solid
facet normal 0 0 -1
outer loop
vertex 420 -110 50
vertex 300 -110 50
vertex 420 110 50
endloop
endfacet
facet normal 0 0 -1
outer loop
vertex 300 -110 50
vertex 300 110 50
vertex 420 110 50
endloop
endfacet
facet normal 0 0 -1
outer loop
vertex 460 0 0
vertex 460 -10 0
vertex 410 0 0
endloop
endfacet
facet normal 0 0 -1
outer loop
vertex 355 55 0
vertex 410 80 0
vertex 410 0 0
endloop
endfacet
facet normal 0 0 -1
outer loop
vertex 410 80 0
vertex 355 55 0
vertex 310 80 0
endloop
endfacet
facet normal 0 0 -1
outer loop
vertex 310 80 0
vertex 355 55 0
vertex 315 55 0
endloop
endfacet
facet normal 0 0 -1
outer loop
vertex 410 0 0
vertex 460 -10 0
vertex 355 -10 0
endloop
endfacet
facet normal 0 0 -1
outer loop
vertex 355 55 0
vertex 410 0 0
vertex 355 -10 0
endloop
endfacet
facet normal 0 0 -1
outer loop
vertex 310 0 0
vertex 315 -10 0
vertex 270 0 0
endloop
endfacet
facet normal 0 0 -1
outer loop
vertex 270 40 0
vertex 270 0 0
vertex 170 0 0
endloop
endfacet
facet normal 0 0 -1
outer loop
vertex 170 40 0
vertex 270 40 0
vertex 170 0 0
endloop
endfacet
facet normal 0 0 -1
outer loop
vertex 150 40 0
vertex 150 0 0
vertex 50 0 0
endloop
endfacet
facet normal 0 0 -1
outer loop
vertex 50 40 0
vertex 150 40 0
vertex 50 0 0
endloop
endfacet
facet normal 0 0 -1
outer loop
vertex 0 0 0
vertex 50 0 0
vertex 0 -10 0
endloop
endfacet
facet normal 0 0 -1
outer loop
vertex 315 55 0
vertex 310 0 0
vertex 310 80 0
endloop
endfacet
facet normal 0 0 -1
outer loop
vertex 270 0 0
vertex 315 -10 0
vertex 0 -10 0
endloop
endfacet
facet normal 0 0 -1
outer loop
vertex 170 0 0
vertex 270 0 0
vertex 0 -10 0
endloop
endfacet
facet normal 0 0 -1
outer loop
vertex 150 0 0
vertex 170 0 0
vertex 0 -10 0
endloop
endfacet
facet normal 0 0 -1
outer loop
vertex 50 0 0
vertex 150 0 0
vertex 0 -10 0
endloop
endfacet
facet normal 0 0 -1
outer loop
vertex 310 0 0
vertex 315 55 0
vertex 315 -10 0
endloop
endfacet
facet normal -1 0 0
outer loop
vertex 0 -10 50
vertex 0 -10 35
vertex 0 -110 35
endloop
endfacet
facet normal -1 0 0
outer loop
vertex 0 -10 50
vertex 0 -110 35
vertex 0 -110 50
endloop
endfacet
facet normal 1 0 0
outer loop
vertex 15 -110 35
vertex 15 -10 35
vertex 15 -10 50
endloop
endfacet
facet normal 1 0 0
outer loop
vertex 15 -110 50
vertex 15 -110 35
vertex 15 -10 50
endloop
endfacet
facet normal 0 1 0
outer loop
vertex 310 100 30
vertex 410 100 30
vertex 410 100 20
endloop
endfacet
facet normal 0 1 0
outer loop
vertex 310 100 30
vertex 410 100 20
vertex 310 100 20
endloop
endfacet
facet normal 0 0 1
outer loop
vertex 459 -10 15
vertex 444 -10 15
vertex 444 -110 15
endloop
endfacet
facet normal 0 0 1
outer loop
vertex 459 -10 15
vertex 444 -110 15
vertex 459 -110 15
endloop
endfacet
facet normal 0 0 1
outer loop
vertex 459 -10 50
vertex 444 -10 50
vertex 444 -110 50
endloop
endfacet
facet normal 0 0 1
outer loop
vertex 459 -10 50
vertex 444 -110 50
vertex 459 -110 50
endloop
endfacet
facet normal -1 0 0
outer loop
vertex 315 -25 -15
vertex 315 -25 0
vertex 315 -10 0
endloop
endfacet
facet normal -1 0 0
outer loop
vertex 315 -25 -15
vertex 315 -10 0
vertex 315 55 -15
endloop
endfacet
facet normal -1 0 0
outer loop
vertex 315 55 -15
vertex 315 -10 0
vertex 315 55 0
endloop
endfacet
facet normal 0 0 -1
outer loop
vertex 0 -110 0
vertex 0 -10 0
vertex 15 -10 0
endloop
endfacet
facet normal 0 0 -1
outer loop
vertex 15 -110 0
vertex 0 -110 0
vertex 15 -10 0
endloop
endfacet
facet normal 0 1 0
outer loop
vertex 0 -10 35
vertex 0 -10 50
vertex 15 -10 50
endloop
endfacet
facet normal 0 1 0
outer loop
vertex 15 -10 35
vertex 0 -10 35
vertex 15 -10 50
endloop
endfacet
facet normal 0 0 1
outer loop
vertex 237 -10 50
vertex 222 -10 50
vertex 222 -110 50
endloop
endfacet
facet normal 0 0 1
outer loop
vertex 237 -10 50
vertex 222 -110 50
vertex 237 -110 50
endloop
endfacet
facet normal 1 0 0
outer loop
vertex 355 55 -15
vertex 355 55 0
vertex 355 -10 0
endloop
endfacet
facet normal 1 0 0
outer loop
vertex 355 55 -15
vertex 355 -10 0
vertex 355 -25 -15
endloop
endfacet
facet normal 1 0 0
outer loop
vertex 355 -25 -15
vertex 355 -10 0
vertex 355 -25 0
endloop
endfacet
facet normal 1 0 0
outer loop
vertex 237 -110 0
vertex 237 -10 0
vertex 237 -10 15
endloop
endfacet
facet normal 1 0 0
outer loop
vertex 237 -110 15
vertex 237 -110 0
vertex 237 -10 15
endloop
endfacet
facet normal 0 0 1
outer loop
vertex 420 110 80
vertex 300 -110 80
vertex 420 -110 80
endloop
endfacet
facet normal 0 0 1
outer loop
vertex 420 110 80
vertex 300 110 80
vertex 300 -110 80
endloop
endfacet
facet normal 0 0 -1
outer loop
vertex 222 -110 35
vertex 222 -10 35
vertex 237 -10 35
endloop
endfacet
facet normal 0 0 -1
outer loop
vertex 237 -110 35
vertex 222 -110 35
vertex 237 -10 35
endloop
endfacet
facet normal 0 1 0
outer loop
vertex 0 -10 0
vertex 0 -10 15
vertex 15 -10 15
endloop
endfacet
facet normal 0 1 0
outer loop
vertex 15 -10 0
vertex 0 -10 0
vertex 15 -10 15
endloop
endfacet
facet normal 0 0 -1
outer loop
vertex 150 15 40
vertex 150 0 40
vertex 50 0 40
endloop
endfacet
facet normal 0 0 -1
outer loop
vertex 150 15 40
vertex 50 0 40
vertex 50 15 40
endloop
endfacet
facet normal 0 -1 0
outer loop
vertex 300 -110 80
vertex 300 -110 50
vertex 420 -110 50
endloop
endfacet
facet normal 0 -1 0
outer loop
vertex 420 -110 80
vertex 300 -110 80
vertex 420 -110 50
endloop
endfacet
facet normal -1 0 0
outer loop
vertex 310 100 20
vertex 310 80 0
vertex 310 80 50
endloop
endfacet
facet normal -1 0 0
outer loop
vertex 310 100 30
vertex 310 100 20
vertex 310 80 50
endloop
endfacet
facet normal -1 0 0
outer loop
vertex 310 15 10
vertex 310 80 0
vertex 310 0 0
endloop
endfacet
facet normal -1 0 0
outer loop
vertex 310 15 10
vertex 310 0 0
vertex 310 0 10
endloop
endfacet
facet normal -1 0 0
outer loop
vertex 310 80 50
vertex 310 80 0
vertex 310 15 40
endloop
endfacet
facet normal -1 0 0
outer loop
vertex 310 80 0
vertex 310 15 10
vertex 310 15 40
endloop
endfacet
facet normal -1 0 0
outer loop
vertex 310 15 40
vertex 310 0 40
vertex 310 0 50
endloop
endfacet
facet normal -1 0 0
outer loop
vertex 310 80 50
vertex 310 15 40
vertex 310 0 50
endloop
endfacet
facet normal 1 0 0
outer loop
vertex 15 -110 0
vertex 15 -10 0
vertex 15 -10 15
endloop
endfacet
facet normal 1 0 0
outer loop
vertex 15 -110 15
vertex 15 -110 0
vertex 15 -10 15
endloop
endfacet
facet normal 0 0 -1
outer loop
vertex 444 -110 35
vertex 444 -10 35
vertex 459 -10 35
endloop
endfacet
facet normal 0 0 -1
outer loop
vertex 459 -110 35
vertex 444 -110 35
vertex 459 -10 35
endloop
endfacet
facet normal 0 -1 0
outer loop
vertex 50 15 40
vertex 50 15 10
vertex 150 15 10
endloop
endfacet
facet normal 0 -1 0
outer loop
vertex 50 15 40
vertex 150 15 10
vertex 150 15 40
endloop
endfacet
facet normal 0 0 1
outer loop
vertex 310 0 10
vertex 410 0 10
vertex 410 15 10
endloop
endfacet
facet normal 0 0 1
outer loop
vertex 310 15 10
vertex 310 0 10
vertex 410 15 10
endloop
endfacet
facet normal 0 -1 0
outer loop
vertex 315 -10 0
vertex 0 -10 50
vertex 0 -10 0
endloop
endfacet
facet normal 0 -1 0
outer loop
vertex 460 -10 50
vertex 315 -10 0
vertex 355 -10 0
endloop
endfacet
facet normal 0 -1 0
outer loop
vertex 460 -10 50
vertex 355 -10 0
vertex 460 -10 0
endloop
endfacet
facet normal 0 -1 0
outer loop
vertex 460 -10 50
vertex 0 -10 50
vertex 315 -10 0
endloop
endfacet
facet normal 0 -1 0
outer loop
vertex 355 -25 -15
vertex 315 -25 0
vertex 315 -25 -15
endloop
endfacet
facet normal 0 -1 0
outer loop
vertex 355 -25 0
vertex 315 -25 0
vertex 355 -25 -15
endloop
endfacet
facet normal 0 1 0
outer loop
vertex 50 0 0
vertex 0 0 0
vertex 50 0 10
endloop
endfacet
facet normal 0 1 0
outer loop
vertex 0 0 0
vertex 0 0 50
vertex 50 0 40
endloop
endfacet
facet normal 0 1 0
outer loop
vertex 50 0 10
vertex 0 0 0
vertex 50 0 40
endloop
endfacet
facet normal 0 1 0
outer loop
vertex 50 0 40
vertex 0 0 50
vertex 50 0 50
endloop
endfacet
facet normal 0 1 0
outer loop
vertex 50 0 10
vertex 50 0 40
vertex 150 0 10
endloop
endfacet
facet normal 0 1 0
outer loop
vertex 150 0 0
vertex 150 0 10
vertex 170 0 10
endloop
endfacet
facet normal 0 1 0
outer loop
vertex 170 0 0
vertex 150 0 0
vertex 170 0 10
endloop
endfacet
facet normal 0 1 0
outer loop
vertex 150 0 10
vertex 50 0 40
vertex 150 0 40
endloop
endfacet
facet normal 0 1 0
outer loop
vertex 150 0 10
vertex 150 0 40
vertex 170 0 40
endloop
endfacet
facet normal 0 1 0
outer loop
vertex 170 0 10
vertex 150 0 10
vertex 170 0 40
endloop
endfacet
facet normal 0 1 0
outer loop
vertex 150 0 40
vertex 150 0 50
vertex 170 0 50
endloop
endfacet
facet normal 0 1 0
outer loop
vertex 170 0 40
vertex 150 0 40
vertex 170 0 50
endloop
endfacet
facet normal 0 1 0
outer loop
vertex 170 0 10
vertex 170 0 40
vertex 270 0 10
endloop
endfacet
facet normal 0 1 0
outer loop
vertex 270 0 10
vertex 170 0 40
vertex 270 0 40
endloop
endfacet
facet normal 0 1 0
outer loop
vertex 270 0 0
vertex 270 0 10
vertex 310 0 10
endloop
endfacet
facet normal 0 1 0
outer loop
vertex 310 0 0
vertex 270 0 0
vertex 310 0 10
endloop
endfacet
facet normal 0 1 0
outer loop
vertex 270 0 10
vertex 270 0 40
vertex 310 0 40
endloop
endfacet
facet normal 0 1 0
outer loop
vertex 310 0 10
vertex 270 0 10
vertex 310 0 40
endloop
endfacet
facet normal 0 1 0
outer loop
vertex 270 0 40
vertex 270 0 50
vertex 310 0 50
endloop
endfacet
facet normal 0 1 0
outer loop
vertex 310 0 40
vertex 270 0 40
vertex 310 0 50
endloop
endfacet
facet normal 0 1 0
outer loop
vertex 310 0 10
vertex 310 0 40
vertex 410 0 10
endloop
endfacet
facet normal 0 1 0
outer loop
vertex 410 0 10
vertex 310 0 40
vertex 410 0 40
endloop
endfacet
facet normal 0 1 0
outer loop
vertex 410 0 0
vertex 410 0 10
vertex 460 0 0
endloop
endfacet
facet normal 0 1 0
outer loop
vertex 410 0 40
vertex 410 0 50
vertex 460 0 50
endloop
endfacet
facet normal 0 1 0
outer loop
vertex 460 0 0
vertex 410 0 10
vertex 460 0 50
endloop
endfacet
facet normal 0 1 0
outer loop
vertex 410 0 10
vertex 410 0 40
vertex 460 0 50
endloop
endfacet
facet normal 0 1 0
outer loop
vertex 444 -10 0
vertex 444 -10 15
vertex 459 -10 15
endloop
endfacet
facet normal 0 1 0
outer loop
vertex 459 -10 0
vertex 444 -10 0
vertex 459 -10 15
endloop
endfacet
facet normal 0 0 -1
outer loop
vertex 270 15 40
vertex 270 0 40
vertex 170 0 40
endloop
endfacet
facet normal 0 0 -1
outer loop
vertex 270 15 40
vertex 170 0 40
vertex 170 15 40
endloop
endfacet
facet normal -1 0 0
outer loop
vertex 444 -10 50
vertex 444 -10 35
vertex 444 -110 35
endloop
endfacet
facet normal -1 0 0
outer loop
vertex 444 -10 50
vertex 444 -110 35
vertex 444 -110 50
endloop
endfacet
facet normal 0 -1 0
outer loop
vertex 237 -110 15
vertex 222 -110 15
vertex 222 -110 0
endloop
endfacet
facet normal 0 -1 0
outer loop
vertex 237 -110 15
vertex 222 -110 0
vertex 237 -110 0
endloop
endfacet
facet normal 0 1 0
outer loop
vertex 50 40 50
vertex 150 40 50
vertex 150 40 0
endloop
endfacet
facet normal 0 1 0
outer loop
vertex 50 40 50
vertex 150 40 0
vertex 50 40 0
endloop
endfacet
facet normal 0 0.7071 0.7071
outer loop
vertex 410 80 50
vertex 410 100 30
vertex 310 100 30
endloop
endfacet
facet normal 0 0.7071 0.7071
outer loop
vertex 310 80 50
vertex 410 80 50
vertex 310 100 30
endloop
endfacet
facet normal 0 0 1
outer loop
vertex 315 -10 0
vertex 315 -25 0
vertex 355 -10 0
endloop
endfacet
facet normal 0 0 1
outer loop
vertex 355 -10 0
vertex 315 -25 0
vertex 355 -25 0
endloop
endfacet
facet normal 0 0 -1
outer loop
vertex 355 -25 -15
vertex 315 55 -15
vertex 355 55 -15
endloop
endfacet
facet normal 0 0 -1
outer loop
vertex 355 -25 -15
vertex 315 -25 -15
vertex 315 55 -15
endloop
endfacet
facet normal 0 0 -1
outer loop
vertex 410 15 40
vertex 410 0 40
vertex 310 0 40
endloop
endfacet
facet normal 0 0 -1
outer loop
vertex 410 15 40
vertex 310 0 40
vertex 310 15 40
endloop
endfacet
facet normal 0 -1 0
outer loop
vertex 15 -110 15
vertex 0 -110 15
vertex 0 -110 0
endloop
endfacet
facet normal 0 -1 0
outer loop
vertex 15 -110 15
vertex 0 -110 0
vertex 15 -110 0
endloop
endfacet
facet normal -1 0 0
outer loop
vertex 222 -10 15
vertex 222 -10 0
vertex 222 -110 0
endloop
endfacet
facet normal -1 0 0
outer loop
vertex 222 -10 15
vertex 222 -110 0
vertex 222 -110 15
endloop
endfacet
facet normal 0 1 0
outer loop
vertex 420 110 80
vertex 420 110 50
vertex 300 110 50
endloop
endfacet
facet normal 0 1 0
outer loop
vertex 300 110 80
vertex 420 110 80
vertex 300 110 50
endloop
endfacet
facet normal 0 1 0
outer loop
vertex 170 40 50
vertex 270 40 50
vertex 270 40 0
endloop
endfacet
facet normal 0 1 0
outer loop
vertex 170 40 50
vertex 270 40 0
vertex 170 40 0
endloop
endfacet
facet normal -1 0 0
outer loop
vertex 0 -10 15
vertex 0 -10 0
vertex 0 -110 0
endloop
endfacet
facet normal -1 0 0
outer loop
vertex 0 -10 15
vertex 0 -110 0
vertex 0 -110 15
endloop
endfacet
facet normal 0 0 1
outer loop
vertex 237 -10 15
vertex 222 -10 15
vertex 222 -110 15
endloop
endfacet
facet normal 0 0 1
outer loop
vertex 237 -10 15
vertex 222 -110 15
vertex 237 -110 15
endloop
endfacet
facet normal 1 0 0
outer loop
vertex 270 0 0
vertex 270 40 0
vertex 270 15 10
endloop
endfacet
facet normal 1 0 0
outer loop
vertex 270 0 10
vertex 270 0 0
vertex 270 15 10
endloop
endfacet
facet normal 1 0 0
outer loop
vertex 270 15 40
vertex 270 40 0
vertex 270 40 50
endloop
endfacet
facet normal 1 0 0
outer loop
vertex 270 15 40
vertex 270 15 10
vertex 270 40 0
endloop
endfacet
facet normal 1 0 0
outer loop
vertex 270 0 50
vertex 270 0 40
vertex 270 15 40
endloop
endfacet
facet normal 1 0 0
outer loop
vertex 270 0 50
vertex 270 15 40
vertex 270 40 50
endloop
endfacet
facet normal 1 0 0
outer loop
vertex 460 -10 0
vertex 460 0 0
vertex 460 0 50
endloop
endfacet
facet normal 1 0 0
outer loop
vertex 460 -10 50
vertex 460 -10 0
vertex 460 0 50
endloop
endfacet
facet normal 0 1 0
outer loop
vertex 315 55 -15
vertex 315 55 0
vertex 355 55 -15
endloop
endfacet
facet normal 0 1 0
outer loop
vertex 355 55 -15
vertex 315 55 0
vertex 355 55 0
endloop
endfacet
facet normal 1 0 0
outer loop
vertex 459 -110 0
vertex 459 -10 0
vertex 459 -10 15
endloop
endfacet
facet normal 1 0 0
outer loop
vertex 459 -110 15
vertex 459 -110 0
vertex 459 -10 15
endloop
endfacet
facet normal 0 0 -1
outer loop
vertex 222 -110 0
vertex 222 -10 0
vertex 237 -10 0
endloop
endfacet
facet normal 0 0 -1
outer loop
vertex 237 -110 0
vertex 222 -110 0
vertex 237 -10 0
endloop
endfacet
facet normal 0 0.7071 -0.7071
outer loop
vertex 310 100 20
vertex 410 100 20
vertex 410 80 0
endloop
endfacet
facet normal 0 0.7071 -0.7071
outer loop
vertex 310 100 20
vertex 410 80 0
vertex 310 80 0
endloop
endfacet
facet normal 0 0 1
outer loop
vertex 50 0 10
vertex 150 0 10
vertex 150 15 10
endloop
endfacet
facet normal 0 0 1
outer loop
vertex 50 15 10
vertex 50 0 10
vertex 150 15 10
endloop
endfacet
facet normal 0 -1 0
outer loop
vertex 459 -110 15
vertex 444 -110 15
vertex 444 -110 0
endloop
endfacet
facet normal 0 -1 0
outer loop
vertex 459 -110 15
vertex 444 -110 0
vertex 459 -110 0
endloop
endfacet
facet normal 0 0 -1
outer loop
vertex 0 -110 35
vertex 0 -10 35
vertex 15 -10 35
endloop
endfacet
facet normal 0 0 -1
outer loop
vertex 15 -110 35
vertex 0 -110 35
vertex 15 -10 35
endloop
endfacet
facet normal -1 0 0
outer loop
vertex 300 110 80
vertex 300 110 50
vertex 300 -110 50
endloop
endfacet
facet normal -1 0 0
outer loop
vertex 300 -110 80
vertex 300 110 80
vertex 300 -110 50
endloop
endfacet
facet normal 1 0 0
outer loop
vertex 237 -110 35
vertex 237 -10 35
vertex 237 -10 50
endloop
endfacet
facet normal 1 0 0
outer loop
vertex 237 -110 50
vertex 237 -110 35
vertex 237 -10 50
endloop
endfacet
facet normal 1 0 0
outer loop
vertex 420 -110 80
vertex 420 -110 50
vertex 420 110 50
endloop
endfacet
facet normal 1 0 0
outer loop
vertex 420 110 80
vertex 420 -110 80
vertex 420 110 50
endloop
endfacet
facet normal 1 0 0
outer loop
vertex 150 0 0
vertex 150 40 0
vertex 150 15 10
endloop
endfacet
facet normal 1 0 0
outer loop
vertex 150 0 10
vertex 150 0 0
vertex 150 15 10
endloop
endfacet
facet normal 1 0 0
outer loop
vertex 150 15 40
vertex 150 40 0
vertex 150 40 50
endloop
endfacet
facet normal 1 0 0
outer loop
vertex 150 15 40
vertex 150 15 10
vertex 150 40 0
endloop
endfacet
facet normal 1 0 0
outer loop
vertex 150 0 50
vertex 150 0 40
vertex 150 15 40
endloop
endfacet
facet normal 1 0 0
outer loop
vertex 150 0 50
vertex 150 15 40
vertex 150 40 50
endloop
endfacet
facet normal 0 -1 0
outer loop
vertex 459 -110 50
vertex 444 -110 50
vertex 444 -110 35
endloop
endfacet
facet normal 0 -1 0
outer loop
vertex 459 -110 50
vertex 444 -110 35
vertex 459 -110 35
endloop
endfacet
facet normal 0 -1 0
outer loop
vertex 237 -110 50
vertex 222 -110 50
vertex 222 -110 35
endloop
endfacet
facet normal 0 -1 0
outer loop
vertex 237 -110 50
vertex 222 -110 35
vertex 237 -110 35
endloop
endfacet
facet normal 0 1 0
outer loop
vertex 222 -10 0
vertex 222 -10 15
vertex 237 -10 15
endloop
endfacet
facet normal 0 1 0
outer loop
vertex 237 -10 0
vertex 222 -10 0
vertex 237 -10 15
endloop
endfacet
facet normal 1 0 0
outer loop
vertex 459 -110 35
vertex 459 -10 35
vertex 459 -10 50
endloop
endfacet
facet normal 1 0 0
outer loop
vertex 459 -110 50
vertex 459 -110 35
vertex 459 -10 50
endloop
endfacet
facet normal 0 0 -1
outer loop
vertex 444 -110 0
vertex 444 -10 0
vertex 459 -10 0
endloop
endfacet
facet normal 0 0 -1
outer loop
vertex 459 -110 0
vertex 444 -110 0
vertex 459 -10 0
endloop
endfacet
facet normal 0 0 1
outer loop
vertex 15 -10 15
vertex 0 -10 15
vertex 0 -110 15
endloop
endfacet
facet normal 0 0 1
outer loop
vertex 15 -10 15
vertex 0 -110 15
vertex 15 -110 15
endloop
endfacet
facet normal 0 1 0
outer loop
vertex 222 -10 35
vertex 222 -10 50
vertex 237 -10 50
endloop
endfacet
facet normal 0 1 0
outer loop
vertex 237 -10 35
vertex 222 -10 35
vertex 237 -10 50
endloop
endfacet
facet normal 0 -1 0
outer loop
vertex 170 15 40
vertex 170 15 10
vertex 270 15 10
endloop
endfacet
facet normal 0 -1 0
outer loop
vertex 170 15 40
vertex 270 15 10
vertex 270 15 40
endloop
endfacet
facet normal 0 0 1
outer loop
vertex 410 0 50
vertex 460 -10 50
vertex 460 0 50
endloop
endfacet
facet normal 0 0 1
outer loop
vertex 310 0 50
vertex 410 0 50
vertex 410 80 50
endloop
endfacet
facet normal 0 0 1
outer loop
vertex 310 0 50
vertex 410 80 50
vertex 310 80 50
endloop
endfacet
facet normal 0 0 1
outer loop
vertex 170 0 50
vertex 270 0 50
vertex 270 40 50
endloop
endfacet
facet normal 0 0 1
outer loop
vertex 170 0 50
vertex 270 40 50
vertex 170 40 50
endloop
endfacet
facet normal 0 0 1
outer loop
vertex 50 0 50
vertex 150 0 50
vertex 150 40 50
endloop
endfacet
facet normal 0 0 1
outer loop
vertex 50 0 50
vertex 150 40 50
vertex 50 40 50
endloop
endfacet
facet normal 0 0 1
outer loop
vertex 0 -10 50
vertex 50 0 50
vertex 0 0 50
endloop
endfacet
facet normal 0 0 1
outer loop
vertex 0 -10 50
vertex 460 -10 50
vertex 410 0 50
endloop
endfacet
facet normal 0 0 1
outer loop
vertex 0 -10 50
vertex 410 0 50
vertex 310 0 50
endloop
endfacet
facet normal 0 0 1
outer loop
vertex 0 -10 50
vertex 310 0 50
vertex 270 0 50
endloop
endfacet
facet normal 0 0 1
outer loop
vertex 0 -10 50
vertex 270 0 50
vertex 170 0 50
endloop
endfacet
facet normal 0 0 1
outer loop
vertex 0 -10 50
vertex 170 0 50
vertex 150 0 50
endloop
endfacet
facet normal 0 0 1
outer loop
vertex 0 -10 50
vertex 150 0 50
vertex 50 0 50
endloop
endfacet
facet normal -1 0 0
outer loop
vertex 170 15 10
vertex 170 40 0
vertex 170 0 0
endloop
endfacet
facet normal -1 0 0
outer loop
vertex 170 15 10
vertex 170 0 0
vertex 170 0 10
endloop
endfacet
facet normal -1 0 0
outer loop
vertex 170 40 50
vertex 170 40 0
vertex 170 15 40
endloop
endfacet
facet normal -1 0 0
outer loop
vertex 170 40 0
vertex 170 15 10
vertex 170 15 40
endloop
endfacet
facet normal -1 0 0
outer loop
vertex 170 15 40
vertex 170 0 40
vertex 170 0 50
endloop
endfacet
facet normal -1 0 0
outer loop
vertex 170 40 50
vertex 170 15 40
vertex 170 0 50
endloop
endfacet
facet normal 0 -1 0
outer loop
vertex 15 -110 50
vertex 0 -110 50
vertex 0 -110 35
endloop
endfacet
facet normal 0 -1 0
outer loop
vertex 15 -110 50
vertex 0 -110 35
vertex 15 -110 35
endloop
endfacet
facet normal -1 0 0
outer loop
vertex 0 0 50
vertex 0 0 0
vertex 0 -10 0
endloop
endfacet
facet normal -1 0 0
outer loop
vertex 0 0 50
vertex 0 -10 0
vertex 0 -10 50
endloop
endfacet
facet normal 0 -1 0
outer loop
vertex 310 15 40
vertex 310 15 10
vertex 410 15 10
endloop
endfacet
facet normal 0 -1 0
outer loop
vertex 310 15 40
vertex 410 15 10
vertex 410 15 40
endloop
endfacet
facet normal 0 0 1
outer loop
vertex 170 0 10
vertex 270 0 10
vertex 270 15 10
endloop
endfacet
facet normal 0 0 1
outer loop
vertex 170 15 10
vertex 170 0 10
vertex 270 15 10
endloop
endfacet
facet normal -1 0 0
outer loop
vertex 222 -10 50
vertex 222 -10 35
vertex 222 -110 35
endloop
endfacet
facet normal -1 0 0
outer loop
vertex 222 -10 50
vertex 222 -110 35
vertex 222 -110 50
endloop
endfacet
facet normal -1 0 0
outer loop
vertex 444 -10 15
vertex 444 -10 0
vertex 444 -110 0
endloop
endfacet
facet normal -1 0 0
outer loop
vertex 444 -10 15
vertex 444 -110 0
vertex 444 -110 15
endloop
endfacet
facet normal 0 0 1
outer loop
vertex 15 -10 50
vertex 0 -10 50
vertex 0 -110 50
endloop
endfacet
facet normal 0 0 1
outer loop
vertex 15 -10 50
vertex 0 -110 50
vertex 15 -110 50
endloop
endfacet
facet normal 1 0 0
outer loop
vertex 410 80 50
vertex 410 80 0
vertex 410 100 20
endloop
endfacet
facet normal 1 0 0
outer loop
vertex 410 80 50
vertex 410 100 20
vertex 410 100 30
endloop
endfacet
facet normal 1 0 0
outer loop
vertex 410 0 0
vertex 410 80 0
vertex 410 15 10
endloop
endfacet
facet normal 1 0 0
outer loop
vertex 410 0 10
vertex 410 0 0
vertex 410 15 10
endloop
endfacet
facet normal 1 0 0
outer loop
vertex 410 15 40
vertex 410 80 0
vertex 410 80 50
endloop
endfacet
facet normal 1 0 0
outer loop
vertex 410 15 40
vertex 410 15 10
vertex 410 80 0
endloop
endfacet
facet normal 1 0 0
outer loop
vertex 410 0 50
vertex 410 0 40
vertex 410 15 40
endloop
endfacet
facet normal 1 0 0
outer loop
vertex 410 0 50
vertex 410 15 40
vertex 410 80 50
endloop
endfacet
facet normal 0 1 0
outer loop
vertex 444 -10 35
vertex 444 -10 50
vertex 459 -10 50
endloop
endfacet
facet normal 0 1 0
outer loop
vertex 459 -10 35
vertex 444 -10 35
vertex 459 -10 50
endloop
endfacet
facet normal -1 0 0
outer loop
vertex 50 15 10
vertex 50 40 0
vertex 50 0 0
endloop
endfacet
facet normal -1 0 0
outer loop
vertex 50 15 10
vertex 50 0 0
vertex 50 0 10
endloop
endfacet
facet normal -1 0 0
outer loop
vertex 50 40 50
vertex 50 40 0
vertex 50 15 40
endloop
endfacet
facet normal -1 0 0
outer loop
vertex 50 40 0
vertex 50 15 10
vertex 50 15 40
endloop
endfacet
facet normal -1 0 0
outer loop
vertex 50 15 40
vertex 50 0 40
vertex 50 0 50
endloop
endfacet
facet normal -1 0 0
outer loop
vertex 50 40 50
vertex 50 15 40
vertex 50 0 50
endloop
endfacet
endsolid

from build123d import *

# Parameters (mm, degrees)
F0_W      = 460
F0_H      = 50
F1_DEPTH  = 10
F2_W      = 15
F2_H      = 15
F3_DEPTH  = 100
F4_W      = 100
F4_H      = 50
F5_DEPTH  = 40
F6_W      = 100
F6_H      = 50
F7_DEPTH  = 60
F8_SIZE   = 20
F9_W      = 120
F9_H      = 100
F10_DEPTH = 30
F11_W     = 40
F11_H     = 65
F11_H_2   = 15
F12_DEPTH = 15
F13_W     = 15
F13_H     = 30
F14_DEPTH = 360.6


with BuildPart() as f1:
    # F0 (on Front) → F1 (new body)
    with BuildSketch(Plane.XZ):
        with Locations((230, 25)):
            Rectangle(F0_W, F0_H)
    extrude(amount=F1_DEPTH)

    # F4 (on face) → F5 (join)
    with BuildSketch(Plane(origin=(0, 0, 0), x_dir=(-1, 0, 0), z_dir=(0, 1, 0))):
        with Locations((-360, 25)):
            Rectangle(F4_W, F4_H)
        with Locations((-220, 25)):
            Rectangle(F4_W, F4_H)
        with Locations((-100, 25)):
            Rectangle(F4_W, F4_H)
    extrude(amount=F5_DEPTH)

    # F6 (on face) → F7 (join)
    with BuildSketch(Plane(origin=(0, 40, 0), x_dir=(-1, 0, 0), z_dir=(0, 1, 0))):
        with Locations((-360, 25)):
            Rectangle(F6_W, F6_H)
    extrude(amount=F7_DEPTH)

    # F8
    f8_edges = [f1.edges().sort_by_distance(p)[0] for p in [
        (360, 100, 0),
        (360, 100, 50),
    ]]
    chamfer(f8_edges, length=F8_SIZE)

    # F11 (on face) → F12 (join)
    with BuildSketch(Plane(origin=(0, 0, 0), x_dir=(1, 0, 0), z_dir=(0, 0, -1))):
        with Locations((335, -22.5)):
            Rectangle(F11_W, F11_H)
        with Locations((335, 17.5)):
            Rectangle(F11_W, F11_H_2)
    extrude(amount=F12_DEPTH)

    # F13 (on face) → F14 (cut)
    with BuildSketch(Plane.YZ.offset(410)):
        with Locations((7.5, 25)):
            Rectangle(F13_W, F13_H)
    extrude(amount=-F14_DEPTH, mode=Mode.SUBTRACT)


with BuildPart() as f3:
    # F2 (on face) → F3 (new body)
    with BuildSketch(Plane.XZ.offset(10)):
        with Locations((7.5, 42.5)):
            Rectangle(F2_W, F2_H)
    extrude(amount=F3_DEPTH)


with BuildPart() as f3b:
    # F2 (on face) → F3, piece 2 (new body)
    with BuildSketch(Plane.XZ.offset(10)):
        with Locations((7.5, 7.5)):
            Rectangle(F2_W, F2_H)
    extrude(amount=F3_DEPTH)


with BuildPart() as f3c:
    # F2 (on face) → F3, piece 3 (new body)
    with BuildSketch(Plane.XZ.offset(10)):
        with Locations((229.5, 42.5)):
            Rectangle(F2_W, F2_H)
    extrude(amount=F3_DEPTH)


with BuildPart() as f3d:
    # F2 (on face) → F3, piece 4 (new body)
    with BuildSketch(Plane.XZ.offset(10)):
        with Locations((229.5, 7.5)):
            Rectangle(F2_W, F2_H)
    extrude(amount=F3_DEPTH)


with BuildPart() as f3e:
    # F2 (on face) → F3, piece 5 (new body)
    with BuildSketch(Plane.XZ.offset(10)):
        with Locations((451.5, 42.5)):
            Rectangle(F2_W, F2_H)
    extrude(amount=F3_DEPTH)


with BuildPart() as f3f:
    # F2 (on face) → F3, piece 6 (new body)
    with BuildSketch(Plane.XZ.offset(10)):
        with Locations((451.5, 7.5)):
            Rectangle(F2_W, F2_H)
    extrude(amount=F3_DEPTH)


with BuildPart() as f10:
    # F9 (on face) → F10 (new body)
    with BuildSketch(Plane.XY.offset(50)):
        with Locations((360, -60)):
            Rectangle(F9_W, F9_H)
        Polygon((420, 110), (300, 110), (300, 0), (310, 0), (310, 80), (410, 80), (410, 0), (420, 0), align=None)
        Polygon((310, 0), (300, 0), (300, -10), (420, -10), (420, 0), (410, 0), (410, 80), (310, 80), align=None)
    extrude(amount=F10_DEPTH)


solid = Compound([f1.part, f3.part, f3b.part, f3c.part, f3d.part, f3e.part, f3f.part, f10.part])
